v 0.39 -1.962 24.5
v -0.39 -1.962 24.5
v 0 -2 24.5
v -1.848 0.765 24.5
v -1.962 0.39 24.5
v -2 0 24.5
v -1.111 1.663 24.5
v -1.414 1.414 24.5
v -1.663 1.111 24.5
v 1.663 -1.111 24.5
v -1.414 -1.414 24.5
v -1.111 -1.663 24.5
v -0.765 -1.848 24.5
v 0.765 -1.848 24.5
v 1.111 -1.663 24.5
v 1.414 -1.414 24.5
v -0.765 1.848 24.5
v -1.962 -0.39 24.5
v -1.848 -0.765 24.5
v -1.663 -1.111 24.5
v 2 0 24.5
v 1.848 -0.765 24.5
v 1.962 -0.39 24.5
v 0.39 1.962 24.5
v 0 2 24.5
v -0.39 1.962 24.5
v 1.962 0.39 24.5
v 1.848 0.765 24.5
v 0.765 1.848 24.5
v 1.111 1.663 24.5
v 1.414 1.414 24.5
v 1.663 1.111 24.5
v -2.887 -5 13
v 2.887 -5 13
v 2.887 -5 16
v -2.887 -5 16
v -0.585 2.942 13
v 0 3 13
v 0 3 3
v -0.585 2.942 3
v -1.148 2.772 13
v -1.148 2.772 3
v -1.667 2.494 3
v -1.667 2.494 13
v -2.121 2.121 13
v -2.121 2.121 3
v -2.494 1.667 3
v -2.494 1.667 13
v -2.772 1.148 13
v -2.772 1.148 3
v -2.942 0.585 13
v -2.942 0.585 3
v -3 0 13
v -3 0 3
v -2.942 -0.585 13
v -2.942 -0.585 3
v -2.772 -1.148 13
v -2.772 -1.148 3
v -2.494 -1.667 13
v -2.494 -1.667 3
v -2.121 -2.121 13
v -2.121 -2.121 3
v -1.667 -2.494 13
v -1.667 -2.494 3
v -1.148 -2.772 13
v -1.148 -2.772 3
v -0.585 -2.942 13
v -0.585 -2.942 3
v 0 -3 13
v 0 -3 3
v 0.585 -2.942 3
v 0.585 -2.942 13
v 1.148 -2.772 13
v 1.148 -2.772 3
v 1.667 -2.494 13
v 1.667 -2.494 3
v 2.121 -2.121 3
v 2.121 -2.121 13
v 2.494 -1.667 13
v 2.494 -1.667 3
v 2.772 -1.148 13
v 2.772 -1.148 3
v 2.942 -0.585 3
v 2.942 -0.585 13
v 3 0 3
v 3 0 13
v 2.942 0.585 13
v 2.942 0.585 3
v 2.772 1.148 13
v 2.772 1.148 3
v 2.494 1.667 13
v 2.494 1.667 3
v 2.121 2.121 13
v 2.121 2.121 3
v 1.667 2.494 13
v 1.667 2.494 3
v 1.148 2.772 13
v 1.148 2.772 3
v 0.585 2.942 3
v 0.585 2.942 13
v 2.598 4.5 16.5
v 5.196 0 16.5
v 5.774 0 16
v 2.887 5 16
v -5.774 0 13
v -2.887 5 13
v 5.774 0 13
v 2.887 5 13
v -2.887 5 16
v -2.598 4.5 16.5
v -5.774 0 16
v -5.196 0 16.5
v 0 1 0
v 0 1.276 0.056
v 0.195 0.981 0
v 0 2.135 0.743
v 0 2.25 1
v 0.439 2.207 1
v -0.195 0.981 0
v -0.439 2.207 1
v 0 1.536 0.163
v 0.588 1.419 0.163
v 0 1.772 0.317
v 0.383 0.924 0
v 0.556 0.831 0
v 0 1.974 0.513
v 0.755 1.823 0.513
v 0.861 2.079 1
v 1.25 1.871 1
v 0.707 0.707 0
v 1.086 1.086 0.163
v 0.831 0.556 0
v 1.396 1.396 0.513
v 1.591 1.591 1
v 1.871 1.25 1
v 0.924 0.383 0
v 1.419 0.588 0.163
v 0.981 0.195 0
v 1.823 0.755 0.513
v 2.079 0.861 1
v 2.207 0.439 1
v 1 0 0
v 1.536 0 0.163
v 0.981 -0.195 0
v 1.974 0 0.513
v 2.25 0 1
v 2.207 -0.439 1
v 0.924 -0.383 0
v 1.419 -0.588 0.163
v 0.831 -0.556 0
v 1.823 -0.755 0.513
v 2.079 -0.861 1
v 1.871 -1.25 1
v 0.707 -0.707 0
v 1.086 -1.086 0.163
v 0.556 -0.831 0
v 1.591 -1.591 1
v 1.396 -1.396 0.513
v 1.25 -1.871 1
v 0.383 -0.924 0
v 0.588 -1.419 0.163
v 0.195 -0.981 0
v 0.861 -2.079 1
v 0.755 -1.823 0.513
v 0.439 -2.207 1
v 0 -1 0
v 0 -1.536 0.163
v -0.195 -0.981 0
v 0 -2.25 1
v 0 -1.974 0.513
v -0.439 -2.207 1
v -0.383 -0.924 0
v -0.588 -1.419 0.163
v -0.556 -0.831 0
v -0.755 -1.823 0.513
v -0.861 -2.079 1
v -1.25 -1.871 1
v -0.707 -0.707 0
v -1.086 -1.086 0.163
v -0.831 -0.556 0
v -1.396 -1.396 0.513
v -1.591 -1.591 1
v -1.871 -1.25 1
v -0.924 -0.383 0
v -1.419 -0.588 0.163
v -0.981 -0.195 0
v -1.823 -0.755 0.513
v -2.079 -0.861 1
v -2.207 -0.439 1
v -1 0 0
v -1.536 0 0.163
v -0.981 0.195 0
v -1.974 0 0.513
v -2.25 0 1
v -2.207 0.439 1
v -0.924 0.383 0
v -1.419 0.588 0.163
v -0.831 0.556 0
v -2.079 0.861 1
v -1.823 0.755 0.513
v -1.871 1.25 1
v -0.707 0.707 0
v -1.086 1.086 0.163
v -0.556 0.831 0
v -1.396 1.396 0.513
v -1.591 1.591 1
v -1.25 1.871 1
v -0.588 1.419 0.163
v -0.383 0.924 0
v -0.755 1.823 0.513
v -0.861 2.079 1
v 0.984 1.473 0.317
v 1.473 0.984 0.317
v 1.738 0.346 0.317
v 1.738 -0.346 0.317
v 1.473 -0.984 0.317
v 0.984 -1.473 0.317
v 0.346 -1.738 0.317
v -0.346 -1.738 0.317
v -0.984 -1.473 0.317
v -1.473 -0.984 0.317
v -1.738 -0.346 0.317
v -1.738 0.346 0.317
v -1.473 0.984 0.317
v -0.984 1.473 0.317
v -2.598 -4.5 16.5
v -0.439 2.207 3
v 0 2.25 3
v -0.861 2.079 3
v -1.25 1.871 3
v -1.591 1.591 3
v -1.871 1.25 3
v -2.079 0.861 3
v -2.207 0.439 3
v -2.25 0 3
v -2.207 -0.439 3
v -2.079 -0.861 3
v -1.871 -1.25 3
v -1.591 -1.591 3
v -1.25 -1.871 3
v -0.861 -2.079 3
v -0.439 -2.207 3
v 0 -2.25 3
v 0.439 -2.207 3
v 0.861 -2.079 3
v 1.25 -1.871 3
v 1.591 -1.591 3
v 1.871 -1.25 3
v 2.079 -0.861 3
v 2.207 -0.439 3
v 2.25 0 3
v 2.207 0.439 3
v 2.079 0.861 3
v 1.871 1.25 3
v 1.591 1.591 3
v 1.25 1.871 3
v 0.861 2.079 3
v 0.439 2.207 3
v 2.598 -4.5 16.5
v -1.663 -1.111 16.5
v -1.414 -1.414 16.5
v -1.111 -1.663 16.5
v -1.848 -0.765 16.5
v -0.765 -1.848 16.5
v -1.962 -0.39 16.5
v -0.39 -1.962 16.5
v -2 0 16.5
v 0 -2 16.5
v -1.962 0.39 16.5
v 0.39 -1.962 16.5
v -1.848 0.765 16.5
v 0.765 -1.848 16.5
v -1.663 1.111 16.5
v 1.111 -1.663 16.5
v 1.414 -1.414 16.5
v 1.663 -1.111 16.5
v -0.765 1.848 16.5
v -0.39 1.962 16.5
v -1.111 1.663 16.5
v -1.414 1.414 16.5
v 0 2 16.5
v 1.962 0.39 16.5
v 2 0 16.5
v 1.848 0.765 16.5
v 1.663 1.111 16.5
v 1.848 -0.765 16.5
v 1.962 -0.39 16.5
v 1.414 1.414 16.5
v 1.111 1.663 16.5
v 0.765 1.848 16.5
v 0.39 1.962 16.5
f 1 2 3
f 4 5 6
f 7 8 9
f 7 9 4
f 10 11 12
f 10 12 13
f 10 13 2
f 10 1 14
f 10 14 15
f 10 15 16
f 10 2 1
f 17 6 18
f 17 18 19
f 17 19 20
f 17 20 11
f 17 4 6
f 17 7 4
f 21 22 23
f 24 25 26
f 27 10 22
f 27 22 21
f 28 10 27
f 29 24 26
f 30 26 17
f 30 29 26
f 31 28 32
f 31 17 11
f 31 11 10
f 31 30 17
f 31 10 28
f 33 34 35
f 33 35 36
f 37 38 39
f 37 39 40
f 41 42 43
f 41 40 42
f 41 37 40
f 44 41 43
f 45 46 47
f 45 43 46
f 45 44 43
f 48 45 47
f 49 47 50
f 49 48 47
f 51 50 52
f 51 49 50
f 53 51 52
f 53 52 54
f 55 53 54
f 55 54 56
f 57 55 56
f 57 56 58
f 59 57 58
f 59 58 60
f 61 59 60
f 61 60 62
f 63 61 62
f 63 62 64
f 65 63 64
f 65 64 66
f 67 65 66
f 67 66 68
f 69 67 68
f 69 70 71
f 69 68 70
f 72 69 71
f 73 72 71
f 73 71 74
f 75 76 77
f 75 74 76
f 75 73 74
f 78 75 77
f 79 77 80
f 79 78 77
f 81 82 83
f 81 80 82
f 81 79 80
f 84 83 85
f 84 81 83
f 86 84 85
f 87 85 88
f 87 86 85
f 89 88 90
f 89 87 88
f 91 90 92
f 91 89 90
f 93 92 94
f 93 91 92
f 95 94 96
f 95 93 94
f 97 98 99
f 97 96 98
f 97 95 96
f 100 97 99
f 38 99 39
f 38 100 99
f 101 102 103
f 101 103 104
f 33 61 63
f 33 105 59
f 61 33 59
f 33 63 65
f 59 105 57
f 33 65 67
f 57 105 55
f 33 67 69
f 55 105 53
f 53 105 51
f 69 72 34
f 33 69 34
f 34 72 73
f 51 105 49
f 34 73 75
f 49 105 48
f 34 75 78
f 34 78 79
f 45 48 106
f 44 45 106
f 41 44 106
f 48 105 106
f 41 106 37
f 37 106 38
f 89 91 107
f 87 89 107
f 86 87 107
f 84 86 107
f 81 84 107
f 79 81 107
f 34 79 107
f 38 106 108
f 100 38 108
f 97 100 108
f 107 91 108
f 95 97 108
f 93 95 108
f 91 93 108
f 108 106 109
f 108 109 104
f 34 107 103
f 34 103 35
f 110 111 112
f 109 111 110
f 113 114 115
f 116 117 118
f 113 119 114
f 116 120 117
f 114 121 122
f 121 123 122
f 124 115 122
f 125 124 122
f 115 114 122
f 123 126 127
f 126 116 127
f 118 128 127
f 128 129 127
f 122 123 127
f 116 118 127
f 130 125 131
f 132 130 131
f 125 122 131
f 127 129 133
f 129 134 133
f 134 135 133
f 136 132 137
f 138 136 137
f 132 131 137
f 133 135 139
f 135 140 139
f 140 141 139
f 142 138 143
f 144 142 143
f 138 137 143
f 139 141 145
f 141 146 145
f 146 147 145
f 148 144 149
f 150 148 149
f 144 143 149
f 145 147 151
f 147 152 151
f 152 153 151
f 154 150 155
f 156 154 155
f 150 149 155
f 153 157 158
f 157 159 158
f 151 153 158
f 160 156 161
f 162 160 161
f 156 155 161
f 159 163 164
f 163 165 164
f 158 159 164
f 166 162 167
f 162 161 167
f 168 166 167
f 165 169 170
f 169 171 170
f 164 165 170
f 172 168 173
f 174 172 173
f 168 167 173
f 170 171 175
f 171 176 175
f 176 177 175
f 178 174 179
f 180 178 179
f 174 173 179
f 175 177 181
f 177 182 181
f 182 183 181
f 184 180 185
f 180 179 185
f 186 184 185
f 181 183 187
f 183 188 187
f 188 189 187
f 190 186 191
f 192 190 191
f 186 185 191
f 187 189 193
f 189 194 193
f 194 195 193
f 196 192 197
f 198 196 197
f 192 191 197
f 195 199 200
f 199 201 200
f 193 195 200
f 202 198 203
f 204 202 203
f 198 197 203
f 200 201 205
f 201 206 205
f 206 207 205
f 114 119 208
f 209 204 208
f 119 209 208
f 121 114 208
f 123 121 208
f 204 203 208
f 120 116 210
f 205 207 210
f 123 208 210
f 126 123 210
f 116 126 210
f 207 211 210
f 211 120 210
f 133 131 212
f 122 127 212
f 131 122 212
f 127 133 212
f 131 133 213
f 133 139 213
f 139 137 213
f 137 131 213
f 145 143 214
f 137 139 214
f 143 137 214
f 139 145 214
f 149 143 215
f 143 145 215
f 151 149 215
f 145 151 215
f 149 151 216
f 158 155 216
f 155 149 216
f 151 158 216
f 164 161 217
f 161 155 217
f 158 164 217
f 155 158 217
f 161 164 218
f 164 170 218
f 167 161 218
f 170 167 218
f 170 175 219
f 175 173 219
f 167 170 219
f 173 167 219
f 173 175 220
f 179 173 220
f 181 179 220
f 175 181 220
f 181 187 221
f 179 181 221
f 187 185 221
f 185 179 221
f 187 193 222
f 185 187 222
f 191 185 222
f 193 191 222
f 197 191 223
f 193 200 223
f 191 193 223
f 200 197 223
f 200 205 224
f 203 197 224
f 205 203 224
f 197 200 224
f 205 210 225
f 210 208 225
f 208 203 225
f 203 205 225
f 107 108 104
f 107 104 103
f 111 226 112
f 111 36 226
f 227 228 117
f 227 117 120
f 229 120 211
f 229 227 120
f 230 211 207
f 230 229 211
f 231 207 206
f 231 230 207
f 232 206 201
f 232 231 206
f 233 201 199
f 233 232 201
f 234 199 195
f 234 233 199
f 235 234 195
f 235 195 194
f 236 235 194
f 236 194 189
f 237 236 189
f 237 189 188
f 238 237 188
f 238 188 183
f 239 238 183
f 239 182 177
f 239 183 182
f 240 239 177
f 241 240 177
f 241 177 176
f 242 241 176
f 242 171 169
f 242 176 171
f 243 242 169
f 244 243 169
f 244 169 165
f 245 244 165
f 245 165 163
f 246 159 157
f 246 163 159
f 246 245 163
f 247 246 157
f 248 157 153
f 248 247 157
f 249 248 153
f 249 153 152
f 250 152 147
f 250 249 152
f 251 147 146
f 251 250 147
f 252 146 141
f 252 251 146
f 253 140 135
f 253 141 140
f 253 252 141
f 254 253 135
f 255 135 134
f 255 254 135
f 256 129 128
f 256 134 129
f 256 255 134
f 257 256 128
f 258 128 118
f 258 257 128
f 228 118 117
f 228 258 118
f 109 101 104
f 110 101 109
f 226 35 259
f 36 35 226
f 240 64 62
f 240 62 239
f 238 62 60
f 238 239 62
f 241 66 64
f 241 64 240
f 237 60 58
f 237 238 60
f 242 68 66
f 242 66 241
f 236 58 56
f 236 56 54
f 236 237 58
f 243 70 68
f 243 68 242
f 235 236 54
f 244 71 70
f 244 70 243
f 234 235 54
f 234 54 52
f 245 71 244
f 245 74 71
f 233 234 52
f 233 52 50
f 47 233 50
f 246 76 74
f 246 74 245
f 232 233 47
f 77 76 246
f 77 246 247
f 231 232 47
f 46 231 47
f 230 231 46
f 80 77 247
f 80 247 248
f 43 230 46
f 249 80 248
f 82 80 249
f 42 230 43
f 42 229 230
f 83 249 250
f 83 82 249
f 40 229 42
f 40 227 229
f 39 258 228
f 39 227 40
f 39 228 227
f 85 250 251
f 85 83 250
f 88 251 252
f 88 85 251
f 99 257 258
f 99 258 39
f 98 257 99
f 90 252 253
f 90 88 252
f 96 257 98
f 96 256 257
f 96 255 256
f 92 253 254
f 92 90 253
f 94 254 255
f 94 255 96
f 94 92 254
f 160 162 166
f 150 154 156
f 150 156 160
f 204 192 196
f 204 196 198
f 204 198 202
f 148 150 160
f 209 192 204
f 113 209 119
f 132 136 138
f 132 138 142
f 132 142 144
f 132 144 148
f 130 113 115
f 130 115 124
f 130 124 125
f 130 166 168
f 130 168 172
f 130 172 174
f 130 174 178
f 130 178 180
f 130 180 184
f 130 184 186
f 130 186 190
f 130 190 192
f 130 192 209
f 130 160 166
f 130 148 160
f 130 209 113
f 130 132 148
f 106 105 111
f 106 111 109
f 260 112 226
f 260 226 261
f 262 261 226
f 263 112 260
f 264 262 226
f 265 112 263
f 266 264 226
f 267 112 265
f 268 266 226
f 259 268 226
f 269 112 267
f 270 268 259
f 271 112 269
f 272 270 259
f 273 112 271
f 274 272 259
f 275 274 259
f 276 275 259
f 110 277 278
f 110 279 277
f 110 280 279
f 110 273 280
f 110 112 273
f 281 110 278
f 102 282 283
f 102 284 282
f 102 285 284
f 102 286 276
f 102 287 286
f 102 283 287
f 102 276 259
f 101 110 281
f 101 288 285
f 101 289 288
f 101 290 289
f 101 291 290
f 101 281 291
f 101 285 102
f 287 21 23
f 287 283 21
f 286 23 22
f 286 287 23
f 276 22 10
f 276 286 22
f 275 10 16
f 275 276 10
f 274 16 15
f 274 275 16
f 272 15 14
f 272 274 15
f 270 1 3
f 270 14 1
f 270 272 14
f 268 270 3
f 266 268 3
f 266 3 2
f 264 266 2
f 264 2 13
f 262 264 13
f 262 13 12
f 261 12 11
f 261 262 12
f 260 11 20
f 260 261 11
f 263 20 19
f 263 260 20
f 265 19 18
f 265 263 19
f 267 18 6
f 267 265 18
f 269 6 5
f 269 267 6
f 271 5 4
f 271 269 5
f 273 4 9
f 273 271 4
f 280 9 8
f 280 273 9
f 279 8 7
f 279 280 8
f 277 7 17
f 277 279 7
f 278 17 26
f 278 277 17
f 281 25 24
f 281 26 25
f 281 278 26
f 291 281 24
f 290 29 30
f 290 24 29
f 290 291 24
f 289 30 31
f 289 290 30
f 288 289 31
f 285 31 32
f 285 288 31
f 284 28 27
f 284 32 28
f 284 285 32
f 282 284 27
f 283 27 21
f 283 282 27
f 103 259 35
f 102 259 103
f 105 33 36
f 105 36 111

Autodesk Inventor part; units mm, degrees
ref_plane "YZ Plane" through (0, 0, 0) normal (1, 0, 0) x (0, 1, 0)
ref_plane "XZ Plane" through (0, 0, 0) normal (0, 1, 0) x (-1, 0, 0)
ref_plane "XY Plane" through (0, 0, 0) normal (0, 0, 1) x (1, 0, 0)
sketch "Sketch2" plane through (0, 0, 0) normal (1, 0, 0) x (0, 1, 0)
  line L0 (0, 0) -> (1, 0)
  line L1 (1, 0) -> (1, 1)
  line L2 (1, 1) -> (2.25, 1)
  line L3 (2.25, 1) -> (2.25, 3)
  line L4 (2.25, 3) -> (3, 3)
  line L5 (3, 3) -> (3, 13)
  line L6 (3, 13) -> (0, 13)
  line L7 (0, 13) -> (0, 0)
  arc A0 (1, 0) -> (2.25, 1) centre (0.8455, 1.4743) ccw
  dimension "d3" = 1
  dimension "d4" = 1
  dimension "d5" = 1.25
  dimension "d6" = 2
  dimension "d7" = 0.75
  dimension "d8" = 10
  dimension "d9" = 3
revolve "Revolution1" add sketch "Sketch2" angle 360 about axis through (0, 0, 13) along (0, 0, -1)
thread "Thread1" size "M6x1" class "6g" standard "ANSI Metric M Profile" full length
sketch "Sketch3" plane through (0, 0, 13) normal (0, 0, 1) x (1, 0, 0)
  line L0 (2.8868, 5) -> (5.7735, 0)
  line L1 (5.7735, 0) -> (2.8868, -5)
  line L2 (2.8868, -5) -> (-2.8868, -5)
  line L3 (-2.8868, -5) -> (-5.7735, 0)
  line L4 (-5.7735, 0) -> (-2.8868, 5)
  line L5 (-2.8868, 5) -> (2.8868, 5)
  point P0 (0, 0)
  point P1 (0, 0)
  dimension "d13" = 10
extrude "Extrusion2" add sketch "Sketch3" along normal blind 3.5
chamfer "Chamfer1" distance 0.5 angle 45 6 edges at (0, 5, 16.5) (4.3301, 2.5, 16.5) (4.3301, -2.5, 16.5) (0, -5, 16.5) (-4.3301, -2.5, 16.5) (-4.3301, 2.5, 16.5)
sketch "Sketch4" plane through (0, 0, 16.5) normal (0, 0, 1) x (1, 0, 0)
  circle A0 centre (0, 0) radius 2
  dimension "d19" = 4
extrude "Extrusion3" add sketch "Sketch4" along normal blind 8
properties part number "Termocupla" material "Steel"
